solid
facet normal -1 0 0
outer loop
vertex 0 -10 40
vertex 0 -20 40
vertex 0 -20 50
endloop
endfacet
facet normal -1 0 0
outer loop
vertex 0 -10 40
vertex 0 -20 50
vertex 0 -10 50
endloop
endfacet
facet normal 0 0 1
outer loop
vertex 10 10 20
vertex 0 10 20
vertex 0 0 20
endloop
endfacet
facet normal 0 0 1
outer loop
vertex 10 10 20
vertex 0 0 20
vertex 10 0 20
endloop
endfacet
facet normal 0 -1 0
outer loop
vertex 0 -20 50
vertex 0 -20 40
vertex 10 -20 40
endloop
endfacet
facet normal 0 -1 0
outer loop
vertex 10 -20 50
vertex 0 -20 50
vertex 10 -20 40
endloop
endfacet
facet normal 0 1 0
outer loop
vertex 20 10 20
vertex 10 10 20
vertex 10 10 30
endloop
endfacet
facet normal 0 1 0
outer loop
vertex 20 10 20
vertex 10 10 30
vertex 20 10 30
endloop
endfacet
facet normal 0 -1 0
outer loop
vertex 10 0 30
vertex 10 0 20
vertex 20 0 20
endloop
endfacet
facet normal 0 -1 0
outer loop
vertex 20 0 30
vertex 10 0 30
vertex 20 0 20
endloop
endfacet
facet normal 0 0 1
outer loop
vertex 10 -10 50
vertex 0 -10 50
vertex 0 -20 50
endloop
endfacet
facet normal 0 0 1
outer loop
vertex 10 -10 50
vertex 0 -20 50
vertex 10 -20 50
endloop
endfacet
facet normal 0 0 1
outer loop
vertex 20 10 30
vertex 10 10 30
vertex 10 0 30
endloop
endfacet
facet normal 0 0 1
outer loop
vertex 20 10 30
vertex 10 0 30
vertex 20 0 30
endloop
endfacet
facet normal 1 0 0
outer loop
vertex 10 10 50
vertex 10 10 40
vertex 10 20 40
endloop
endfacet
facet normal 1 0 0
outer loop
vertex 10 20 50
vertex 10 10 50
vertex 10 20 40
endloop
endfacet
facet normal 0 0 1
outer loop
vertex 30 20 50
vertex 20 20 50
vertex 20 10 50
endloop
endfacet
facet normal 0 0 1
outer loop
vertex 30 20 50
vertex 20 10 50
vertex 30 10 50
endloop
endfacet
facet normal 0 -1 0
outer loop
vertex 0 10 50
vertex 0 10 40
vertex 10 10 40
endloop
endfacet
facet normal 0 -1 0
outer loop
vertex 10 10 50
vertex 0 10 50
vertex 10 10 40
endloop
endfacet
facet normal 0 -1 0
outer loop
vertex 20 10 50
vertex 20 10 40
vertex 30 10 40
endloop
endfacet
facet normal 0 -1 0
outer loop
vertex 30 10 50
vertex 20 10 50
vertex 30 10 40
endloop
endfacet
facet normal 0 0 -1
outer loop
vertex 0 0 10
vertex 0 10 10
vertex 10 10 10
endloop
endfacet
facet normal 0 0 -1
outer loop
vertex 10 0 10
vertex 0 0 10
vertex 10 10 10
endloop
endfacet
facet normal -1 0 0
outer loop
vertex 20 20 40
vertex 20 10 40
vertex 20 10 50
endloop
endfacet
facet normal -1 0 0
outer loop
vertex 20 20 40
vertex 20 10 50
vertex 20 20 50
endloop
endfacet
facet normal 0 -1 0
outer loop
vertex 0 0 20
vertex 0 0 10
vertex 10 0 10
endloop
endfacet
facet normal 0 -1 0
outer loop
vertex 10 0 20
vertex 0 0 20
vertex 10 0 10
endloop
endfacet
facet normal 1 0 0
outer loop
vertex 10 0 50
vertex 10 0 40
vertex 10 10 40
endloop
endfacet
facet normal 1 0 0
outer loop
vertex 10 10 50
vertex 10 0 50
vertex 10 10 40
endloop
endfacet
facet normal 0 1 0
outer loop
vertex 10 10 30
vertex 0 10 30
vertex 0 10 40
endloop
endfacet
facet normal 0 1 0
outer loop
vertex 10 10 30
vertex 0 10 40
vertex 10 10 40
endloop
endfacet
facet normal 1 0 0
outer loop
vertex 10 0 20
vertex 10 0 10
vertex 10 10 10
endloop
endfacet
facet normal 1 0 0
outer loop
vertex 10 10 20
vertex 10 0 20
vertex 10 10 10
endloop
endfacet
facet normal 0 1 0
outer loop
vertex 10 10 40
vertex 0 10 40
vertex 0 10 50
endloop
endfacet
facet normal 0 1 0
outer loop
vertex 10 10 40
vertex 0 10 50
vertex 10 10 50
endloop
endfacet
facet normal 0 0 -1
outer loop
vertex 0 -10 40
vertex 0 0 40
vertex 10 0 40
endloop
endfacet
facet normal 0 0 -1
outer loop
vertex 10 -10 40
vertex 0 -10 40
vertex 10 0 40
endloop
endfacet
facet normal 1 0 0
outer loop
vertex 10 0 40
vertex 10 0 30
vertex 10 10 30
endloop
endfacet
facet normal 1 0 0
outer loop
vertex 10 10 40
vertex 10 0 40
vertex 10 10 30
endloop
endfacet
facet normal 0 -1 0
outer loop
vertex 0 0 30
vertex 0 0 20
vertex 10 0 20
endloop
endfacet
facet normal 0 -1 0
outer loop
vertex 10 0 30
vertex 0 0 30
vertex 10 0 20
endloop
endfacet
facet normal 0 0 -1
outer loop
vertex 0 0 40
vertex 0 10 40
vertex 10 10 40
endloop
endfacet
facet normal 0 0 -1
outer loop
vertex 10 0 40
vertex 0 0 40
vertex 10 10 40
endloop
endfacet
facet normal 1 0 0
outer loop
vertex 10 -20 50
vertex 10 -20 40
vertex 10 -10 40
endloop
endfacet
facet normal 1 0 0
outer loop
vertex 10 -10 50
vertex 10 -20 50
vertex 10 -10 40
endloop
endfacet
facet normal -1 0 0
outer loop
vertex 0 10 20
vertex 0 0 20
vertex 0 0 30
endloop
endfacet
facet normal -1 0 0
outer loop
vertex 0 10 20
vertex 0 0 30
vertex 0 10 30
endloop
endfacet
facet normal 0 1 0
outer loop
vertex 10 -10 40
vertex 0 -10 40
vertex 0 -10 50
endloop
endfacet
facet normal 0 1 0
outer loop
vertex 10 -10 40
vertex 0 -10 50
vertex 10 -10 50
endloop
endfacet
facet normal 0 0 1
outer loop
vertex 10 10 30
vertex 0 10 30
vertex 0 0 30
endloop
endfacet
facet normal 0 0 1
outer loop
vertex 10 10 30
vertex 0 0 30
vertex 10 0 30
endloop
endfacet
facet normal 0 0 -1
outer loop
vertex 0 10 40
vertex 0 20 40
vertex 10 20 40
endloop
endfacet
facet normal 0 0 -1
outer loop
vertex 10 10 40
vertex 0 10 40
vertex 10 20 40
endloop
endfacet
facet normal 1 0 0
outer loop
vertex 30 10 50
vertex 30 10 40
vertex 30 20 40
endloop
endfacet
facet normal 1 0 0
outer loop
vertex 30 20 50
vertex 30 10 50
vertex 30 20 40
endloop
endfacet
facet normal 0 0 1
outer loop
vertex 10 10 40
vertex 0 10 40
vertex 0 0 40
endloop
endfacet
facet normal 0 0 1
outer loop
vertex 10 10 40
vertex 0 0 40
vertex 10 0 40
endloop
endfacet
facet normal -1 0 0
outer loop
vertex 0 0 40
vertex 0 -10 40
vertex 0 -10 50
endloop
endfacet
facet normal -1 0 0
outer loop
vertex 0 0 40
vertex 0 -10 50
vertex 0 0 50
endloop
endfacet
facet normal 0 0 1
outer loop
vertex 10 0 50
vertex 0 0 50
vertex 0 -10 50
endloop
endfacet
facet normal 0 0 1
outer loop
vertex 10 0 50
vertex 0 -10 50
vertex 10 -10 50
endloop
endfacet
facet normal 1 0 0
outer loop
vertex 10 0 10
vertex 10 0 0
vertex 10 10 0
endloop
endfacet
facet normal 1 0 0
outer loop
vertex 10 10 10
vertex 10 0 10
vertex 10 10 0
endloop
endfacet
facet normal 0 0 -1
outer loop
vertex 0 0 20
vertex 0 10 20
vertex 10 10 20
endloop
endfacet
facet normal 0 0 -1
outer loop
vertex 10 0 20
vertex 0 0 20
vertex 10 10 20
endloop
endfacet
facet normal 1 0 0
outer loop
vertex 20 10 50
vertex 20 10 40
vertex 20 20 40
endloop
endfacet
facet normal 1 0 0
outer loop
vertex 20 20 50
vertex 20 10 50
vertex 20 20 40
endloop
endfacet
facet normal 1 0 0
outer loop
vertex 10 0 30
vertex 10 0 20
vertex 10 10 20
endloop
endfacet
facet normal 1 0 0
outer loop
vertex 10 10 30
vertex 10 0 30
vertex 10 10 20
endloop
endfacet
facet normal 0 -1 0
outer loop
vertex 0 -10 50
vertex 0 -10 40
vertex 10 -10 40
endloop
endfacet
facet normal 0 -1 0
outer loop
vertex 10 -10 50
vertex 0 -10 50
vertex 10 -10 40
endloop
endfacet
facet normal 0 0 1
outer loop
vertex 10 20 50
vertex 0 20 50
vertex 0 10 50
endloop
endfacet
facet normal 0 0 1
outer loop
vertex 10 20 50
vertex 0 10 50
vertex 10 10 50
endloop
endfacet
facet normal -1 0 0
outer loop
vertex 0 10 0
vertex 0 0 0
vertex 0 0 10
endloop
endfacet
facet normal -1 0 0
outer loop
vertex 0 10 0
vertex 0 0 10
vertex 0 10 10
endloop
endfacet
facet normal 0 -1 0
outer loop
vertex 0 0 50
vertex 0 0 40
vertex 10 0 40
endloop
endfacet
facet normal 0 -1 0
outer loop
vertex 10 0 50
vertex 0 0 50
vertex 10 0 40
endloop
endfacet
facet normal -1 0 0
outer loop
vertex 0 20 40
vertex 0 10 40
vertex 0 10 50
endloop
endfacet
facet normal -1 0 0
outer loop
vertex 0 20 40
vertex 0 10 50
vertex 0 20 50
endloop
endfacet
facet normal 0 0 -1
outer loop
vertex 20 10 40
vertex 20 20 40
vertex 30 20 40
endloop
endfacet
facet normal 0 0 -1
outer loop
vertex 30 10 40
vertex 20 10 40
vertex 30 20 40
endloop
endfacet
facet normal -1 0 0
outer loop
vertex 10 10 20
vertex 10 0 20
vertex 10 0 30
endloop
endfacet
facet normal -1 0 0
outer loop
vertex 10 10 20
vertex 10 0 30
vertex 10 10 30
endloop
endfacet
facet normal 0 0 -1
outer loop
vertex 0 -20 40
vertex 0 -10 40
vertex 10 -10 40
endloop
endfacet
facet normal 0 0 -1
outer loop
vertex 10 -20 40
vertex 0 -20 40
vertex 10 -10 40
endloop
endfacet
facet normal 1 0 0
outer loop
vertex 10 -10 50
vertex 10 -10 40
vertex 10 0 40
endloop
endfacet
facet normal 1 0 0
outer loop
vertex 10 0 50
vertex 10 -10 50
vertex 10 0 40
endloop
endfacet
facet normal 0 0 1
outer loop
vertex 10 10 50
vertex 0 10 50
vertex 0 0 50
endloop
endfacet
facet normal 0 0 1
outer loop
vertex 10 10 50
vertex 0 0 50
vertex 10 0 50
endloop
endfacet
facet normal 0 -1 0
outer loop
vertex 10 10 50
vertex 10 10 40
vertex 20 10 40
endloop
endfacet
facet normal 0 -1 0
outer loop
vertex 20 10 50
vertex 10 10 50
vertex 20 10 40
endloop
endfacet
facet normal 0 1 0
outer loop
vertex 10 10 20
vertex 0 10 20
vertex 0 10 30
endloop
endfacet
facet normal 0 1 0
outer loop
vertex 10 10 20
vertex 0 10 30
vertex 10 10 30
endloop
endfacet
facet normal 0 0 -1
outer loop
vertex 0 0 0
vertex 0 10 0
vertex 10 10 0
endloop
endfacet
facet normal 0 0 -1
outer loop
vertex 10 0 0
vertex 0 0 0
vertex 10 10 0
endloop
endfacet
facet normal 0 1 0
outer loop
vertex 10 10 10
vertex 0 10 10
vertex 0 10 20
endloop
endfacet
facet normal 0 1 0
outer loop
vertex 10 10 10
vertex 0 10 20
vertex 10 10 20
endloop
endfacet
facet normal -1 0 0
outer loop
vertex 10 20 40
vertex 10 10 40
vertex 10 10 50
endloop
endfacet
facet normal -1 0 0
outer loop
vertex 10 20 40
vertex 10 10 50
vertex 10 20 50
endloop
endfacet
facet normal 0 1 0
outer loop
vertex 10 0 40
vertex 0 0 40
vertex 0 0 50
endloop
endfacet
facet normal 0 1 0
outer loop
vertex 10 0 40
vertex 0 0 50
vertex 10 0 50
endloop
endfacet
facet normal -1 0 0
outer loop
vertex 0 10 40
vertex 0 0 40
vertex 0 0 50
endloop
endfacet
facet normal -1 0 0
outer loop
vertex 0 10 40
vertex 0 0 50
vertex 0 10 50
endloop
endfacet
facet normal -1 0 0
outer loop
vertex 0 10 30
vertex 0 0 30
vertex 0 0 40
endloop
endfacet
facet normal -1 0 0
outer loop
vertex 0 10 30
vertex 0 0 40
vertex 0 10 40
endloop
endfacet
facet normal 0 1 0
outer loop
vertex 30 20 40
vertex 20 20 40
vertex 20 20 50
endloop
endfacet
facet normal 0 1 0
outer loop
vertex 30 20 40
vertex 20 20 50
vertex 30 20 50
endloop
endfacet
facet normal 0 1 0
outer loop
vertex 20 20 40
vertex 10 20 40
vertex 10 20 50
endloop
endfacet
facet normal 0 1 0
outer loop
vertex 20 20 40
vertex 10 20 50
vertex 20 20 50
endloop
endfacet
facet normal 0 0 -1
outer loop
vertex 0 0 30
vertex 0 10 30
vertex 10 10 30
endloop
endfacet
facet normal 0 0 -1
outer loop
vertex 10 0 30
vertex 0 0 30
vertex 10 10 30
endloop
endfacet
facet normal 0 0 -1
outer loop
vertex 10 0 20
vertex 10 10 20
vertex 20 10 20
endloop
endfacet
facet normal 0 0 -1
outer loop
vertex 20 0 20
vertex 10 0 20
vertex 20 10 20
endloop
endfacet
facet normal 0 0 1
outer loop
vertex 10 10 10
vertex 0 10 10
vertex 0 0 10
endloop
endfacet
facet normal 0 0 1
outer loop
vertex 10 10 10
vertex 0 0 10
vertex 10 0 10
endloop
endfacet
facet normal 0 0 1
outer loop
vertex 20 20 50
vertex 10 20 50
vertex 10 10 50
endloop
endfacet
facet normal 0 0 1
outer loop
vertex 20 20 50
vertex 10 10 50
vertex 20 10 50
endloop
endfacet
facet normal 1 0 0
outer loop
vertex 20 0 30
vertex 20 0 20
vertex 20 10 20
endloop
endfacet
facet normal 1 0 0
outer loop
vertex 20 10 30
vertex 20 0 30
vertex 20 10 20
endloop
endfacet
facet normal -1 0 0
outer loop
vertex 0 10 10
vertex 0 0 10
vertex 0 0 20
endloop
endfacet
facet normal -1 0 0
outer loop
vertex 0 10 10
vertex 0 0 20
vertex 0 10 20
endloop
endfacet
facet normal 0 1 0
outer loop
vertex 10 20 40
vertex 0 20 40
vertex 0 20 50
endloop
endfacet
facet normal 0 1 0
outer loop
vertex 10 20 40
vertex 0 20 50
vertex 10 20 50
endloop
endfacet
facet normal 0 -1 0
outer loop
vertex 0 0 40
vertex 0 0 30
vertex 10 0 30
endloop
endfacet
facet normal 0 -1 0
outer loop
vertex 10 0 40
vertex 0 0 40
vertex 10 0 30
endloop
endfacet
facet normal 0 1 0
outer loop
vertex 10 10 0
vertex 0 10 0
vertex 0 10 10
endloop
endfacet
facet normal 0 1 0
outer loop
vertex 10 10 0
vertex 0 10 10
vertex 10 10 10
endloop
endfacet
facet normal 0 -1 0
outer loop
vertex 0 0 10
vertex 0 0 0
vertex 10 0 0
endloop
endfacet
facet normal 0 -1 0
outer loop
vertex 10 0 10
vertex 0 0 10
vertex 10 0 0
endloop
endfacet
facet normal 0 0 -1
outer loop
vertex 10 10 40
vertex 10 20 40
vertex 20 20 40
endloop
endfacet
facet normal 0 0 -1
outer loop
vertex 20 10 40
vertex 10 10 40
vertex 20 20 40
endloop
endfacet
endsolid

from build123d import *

# Parameters (mm, degrees)
BOX_W        = 10
BOX_H        = 10
BOX_DEPTH    = 10
BOX001_W     = 10
BOX001_H     = 10
BOX001_DEPTH = 10
BOX002_W     = 10
BOX002_H     = 10
BOX002_DEPTH = 10
BOX003_W     = 10
BOX003_H     = 10
BOX003_DEPTH = 10
BOX004_W     = 10
BOX004_H     = 10
BOX004_DEPTH = 10
BOX005_W     = 10
BOX005_H     = 10
BOX005_DEPTH = 10
BOX006_W     = 10
BOX006_H     = 10
BOX006_DEPTH = 10
BOX007_W     = 10
BOX007_H     = 10
BOX007_DEPTH = 10
BOX008_W     = 10
BOX008_H     = 10
BOX008_DEPTH = 10
BOX009_W     = 10
BOX009_H     = 10
BOX009_DEPTH = 10
BOX010_W     = 10
BOX010_H     = 10
BOX010_DEPTH = 10


with BuildPart() as cubo:
    # Box → Box (new body)
    with BuildSketch(Plane.XY):
        with Locations((5, 5)):
            Rectangle(BOX_W, BOX_H)
    extrude(amount=BOX_DEPTH)


with BuildPart() as cubo001:
    # Box001 → Box001 (new body)
    with BuildSketch(Plane.XY.offset(10)):
        with Locations((5, 5)):
            Rectangle(BOX001_W, BOX001_H)
    extrude(amount=BOX001_DEPTH)


with BuildPart() as cubo002:
    # Box002 → Box002 (new body)
    with BuildSketch(Plane.XY.offset(20)):
        with Locations((5, 5)):
            Rectangle(BOX002_W, BOX002_H)
    extrude(amount=BOX002_DEPTH)


with BuildPart() as cubo003:
    # Box003 → Box003 (new body)
    with BuildSketch(Plane.XY.offset(30)):
        with Locations((5, 5)):
            Rectangle(BOX003_W, BOX003_H)
    extrude(amount=BOX003_DEPTH)


with BuildPart() as cubo004:
    # Box004 → Box004 (new body)
    with BuildSketch(Plane.XY.offset(40)):
        with Locations((5, 5)):
            Rectangle(BOX004_W, BOX004_H)
    extrude(amount=BOX004_DEPTH)


with BuildPart() as cubo005:
    # Box005 → Box005 (new body)
    with BuildSketch(Plane(origin=(10, 0, 20), x_dir=(1, 0, 0), z_dir=(0, 0, 1))):
        with Locations((5, 5)):
            Rectangle(BOX005_W, BOX005_H)
    extrude(amount=BOX005_DEPTH)


with BuildPart() as cubo006:
    # Box006 → Box006 (new body)
    with BuildSketch(Plane(origin=(0, -10, 40), x_dir=(1, 0, 0), z_dir=(0, 0, 1))):
        with Locations((5, 5)):
            Rectangle(BOX006_W, BOX006_H)
    extrude(amount=BOX006_DEPTH)


with BuildPart() as cubo007:
    # Box007 → Box007 (new body)
    with BuildSketch(Plane(origin=(0, -20, 40), x_dir=(1, 0, 0), z_dir=(0, 0, 1))):
        with Locations((5, 5)):
            Rectangle(BOX007_W, BOX007_H)
    extrude(amount=BOX007_DEPTH)


with BuildPart() as cubo008:
    # Box008 → Box008 (new body)
    with BuildSketch(Plane(origin=(0, 10, 40), x_dir=(1, 0, 0), z_dir=(0, 0, 1))):
        with Locations((5, 5)):
            Rectangle(BOX008_W, BOX008_H)
    extrude(amount=BOX008_DEPTH)


with BuildPart() as cubo009:
    # Box009 → Box009 (new body)
    with BuildSketch(Plane(origin=(10, 10, 40), x_dir=(1, 0, 0), z_dir=(0, 0, 1))):
        with Locations((5, 5)):
            Rectangle(BOX009_W, BOX009_H)
    extrude(amount=BOX009_DEPTH)


with BuildPart() as cubo010:
    # Box010 → Box010 (new body)
    with BuildSketch(Plane(origin=(20, 10, 40), x_dir=(1, 0, 0), z_dir=(0, 0, 1))):
        with Locations((5, 5)):
            Rectangle(BOX010_W, BOX010_H)
    extrude(amount=BOX010_DEPTH)


solid = Compound([cubo.part, cubo001.part, cubo002.part, cubo003.part, cubo004.part, cubo005.part, cubo006.part, cubo007.part, cubo008.part, cubo009.part, cubo010.part])
